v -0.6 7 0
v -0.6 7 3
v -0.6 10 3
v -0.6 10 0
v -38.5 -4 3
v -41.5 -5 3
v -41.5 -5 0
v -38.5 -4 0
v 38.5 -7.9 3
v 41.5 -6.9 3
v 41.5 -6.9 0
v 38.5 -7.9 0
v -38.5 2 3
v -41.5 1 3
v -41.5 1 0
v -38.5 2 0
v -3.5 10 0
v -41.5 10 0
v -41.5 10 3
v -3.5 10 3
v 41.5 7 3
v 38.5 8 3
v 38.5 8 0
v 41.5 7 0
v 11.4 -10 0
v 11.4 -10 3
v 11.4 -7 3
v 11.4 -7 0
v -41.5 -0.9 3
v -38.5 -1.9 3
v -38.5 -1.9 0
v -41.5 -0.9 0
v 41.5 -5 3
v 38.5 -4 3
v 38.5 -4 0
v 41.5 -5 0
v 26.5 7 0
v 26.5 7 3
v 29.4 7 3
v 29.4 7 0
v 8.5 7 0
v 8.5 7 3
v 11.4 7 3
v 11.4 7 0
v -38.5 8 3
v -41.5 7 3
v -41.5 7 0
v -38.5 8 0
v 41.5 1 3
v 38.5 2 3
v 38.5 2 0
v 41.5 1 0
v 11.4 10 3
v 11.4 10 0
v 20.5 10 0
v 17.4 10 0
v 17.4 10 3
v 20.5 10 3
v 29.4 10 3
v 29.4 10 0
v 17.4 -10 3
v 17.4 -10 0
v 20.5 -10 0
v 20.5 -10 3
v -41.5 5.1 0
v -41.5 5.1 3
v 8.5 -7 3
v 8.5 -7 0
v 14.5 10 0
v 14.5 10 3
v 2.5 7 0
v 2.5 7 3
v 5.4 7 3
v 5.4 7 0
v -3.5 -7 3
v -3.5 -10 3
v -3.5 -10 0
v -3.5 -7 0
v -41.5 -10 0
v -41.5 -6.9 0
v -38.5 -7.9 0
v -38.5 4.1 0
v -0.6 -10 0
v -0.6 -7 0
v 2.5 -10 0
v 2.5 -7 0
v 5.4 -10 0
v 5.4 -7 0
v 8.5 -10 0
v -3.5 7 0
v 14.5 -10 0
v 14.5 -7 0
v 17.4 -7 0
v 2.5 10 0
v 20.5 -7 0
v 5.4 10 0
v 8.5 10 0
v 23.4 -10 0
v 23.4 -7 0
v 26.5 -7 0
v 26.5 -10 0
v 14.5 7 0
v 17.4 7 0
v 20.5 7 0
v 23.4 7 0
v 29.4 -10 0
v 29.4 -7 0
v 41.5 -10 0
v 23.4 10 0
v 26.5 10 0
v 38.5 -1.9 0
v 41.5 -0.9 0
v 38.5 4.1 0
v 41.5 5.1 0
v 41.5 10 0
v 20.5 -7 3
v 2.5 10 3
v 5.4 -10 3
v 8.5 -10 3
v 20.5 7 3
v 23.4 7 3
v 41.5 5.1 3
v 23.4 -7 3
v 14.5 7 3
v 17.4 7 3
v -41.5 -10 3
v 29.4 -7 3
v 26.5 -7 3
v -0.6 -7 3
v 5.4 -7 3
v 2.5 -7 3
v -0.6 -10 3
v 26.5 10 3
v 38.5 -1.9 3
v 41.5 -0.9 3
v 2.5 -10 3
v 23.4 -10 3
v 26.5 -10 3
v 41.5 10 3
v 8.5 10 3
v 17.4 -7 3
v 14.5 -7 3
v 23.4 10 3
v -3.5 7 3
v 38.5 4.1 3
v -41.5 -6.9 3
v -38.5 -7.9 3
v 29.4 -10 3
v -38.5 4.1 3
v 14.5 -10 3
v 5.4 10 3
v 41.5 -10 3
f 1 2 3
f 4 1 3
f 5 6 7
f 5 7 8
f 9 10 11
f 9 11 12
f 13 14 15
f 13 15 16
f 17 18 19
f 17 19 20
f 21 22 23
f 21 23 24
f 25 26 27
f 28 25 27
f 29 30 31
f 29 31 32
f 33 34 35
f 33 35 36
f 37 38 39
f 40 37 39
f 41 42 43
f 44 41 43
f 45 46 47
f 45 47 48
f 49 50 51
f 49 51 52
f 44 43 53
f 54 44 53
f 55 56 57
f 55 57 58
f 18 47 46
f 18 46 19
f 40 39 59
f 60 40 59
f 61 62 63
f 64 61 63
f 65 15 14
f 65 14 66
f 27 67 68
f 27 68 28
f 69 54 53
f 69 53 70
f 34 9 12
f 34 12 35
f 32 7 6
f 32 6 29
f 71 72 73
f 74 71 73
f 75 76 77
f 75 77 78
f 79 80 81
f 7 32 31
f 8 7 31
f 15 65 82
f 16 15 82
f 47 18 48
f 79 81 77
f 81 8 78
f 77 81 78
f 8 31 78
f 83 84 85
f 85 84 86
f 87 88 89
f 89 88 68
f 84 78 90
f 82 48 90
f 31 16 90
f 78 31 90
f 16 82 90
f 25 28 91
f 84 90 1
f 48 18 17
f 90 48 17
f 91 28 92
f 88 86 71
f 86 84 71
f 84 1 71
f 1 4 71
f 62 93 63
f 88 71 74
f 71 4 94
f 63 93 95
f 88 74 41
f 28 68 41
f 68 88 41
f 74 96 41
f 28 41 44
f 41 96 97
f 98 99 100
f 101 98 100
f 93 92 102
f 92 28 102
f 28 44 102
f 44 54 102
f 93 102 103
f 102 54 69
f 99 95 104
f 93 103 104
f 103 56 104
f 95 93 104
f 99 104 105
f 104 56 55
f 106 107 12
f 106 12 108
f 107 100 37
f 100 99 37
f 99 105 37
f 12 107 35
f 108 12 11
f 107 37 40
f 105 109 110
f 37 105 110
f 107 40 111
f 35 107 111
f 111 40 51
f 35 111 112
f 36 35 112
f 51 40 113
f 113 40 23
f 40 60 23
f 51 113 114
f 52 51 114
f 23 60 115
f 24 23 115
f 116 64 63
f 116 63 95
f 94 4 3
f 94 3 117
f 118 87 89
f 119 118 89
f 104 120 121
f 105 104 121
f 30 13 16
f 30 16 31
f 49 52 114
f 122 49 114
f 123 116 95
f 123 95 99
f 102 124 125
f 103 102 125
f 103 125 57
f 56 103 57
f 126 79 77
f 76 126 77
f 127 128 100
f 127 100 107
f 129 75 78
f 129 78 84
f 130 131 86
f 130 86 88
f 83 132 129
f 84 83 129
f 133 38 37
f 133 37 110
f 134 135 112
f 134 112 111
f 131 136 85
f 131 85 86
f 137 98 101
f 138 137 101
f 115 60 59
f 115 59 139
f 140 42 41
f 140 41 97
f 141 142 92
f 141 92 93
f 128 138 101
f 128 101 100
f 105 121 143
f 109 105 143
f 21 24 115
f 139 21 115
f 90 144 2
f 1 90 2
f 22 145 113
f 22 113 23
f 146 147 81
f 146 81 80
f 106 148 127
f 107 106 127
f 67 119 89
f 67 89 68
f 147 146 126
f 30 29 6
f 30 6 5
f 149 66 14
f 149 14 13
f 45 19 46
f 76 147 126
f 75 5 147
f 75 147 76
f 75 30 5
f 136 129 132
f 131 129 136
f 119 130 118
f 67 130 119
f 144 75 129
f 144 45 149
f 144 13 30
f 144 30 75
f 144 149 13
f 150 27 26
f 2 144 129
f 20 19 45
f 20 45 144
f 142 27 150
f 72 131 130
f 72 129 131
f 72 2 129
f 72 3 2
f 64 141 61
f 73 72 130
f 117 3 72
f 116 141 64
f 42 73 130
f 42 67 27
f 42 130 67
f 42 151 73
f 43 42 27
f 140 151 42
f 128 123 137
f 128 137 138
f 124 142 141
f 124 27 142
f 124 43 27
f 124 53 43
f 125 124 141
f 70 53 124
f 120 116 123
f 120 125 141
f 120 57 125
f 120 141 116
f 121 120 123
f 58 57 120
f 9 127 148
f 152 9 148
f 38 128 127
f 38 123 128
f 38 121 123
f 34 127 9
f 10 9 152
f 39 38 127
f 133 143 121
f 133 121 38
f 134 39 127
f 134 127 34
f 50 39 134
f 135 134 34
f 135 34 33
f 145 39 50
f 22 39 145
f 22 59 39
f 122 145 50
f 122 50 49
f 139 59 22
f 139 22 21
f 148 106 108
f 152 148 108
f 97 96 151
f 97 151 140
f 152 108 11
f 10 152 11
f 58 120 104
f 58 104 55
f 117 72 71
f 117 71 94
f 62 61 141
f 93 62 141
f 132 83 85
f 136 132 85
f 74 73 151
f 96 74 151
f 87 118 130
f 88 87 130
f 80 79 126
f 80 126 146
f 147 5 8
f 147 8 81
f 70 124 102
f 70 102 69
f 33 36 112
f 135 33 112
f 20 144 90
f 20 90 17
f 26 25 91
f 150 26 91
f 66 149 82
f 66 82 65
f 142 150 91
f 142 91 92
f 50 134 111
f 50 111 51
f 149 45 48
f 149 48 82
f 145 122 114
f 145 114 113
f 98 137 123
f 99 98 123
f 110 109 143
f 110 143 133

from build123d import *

# Parameters (mm, degrees)
SKETCH_W               = 83
SKETCH_H               = 20
PAD_DEPTH              = 3
SKETCH002_W            = 2.9
SKETCH002_H            = 3
POCKET_DEPTH           = 5
LINEARPATTERN_COUNT    = 6
LINEARPATTERN_PITCH    = 6
POCKET001_DEPTH        = 5
LINEARPATTERN001_COUNT = 3
LINEARPATTERN001_PITCH = 6


with BuildPart() as part:
    # Sketch → Pad (new body)
    with BuildSketch(Plane.XY):
        Rectangle(SKETCH_W, SKETCH_H)
    extrude(amount=PAD_DEPTH)

    # Sketch002 → Pocket (cut)
    with BuildSketch(Plane.XY.offset(3)):
        with Locations((-2.05, 8.5)):
            Rectangle(SKETCH002_W, SKETCH002_H)
        with Locations((-2.05, -8.5)):
            Rectangle(SKETCH002_W, SKETCH002_H)
    pocket = extrude(amount=-POCKET_DEPTH, mode=Mode.SUBTRACT)

    # LinearPattern: Pocket ×6
    with Locations(*[(i * LINEARPATTERN_PITCH, 0, 0) for i in range(1, LINEARPATTERN_COUNT)]):
        add(pocket, mode=Mode.SUBTRACT)

    # Sketch003 → Pocket001 (cut)
    with BuildSketch(Plane.XY.offset(3)):
        Polygon((-41.5, 7), (-38.5, 8), (-38.5, 4.1), (-41.5, 5.1), align=None)
        Polygon((38.5, 8), (41.5, 7), (41.5, 5.1), (38.5, 4.1), align=None)
    pocket001 = extrude(amount=-POCKET001_DEPTH, mode=Mode.SUBTRACT)

    # LinearPattern001: Pocket001 ×3
    with Locations(*[(0, -i * LINEARPATTERN001_PITCH, 0) for i in range(1, LINEARPATTERN001_COUNT)]):
        add(pocket001, mode=Mode.SUBTRACT)


solid = part.part
